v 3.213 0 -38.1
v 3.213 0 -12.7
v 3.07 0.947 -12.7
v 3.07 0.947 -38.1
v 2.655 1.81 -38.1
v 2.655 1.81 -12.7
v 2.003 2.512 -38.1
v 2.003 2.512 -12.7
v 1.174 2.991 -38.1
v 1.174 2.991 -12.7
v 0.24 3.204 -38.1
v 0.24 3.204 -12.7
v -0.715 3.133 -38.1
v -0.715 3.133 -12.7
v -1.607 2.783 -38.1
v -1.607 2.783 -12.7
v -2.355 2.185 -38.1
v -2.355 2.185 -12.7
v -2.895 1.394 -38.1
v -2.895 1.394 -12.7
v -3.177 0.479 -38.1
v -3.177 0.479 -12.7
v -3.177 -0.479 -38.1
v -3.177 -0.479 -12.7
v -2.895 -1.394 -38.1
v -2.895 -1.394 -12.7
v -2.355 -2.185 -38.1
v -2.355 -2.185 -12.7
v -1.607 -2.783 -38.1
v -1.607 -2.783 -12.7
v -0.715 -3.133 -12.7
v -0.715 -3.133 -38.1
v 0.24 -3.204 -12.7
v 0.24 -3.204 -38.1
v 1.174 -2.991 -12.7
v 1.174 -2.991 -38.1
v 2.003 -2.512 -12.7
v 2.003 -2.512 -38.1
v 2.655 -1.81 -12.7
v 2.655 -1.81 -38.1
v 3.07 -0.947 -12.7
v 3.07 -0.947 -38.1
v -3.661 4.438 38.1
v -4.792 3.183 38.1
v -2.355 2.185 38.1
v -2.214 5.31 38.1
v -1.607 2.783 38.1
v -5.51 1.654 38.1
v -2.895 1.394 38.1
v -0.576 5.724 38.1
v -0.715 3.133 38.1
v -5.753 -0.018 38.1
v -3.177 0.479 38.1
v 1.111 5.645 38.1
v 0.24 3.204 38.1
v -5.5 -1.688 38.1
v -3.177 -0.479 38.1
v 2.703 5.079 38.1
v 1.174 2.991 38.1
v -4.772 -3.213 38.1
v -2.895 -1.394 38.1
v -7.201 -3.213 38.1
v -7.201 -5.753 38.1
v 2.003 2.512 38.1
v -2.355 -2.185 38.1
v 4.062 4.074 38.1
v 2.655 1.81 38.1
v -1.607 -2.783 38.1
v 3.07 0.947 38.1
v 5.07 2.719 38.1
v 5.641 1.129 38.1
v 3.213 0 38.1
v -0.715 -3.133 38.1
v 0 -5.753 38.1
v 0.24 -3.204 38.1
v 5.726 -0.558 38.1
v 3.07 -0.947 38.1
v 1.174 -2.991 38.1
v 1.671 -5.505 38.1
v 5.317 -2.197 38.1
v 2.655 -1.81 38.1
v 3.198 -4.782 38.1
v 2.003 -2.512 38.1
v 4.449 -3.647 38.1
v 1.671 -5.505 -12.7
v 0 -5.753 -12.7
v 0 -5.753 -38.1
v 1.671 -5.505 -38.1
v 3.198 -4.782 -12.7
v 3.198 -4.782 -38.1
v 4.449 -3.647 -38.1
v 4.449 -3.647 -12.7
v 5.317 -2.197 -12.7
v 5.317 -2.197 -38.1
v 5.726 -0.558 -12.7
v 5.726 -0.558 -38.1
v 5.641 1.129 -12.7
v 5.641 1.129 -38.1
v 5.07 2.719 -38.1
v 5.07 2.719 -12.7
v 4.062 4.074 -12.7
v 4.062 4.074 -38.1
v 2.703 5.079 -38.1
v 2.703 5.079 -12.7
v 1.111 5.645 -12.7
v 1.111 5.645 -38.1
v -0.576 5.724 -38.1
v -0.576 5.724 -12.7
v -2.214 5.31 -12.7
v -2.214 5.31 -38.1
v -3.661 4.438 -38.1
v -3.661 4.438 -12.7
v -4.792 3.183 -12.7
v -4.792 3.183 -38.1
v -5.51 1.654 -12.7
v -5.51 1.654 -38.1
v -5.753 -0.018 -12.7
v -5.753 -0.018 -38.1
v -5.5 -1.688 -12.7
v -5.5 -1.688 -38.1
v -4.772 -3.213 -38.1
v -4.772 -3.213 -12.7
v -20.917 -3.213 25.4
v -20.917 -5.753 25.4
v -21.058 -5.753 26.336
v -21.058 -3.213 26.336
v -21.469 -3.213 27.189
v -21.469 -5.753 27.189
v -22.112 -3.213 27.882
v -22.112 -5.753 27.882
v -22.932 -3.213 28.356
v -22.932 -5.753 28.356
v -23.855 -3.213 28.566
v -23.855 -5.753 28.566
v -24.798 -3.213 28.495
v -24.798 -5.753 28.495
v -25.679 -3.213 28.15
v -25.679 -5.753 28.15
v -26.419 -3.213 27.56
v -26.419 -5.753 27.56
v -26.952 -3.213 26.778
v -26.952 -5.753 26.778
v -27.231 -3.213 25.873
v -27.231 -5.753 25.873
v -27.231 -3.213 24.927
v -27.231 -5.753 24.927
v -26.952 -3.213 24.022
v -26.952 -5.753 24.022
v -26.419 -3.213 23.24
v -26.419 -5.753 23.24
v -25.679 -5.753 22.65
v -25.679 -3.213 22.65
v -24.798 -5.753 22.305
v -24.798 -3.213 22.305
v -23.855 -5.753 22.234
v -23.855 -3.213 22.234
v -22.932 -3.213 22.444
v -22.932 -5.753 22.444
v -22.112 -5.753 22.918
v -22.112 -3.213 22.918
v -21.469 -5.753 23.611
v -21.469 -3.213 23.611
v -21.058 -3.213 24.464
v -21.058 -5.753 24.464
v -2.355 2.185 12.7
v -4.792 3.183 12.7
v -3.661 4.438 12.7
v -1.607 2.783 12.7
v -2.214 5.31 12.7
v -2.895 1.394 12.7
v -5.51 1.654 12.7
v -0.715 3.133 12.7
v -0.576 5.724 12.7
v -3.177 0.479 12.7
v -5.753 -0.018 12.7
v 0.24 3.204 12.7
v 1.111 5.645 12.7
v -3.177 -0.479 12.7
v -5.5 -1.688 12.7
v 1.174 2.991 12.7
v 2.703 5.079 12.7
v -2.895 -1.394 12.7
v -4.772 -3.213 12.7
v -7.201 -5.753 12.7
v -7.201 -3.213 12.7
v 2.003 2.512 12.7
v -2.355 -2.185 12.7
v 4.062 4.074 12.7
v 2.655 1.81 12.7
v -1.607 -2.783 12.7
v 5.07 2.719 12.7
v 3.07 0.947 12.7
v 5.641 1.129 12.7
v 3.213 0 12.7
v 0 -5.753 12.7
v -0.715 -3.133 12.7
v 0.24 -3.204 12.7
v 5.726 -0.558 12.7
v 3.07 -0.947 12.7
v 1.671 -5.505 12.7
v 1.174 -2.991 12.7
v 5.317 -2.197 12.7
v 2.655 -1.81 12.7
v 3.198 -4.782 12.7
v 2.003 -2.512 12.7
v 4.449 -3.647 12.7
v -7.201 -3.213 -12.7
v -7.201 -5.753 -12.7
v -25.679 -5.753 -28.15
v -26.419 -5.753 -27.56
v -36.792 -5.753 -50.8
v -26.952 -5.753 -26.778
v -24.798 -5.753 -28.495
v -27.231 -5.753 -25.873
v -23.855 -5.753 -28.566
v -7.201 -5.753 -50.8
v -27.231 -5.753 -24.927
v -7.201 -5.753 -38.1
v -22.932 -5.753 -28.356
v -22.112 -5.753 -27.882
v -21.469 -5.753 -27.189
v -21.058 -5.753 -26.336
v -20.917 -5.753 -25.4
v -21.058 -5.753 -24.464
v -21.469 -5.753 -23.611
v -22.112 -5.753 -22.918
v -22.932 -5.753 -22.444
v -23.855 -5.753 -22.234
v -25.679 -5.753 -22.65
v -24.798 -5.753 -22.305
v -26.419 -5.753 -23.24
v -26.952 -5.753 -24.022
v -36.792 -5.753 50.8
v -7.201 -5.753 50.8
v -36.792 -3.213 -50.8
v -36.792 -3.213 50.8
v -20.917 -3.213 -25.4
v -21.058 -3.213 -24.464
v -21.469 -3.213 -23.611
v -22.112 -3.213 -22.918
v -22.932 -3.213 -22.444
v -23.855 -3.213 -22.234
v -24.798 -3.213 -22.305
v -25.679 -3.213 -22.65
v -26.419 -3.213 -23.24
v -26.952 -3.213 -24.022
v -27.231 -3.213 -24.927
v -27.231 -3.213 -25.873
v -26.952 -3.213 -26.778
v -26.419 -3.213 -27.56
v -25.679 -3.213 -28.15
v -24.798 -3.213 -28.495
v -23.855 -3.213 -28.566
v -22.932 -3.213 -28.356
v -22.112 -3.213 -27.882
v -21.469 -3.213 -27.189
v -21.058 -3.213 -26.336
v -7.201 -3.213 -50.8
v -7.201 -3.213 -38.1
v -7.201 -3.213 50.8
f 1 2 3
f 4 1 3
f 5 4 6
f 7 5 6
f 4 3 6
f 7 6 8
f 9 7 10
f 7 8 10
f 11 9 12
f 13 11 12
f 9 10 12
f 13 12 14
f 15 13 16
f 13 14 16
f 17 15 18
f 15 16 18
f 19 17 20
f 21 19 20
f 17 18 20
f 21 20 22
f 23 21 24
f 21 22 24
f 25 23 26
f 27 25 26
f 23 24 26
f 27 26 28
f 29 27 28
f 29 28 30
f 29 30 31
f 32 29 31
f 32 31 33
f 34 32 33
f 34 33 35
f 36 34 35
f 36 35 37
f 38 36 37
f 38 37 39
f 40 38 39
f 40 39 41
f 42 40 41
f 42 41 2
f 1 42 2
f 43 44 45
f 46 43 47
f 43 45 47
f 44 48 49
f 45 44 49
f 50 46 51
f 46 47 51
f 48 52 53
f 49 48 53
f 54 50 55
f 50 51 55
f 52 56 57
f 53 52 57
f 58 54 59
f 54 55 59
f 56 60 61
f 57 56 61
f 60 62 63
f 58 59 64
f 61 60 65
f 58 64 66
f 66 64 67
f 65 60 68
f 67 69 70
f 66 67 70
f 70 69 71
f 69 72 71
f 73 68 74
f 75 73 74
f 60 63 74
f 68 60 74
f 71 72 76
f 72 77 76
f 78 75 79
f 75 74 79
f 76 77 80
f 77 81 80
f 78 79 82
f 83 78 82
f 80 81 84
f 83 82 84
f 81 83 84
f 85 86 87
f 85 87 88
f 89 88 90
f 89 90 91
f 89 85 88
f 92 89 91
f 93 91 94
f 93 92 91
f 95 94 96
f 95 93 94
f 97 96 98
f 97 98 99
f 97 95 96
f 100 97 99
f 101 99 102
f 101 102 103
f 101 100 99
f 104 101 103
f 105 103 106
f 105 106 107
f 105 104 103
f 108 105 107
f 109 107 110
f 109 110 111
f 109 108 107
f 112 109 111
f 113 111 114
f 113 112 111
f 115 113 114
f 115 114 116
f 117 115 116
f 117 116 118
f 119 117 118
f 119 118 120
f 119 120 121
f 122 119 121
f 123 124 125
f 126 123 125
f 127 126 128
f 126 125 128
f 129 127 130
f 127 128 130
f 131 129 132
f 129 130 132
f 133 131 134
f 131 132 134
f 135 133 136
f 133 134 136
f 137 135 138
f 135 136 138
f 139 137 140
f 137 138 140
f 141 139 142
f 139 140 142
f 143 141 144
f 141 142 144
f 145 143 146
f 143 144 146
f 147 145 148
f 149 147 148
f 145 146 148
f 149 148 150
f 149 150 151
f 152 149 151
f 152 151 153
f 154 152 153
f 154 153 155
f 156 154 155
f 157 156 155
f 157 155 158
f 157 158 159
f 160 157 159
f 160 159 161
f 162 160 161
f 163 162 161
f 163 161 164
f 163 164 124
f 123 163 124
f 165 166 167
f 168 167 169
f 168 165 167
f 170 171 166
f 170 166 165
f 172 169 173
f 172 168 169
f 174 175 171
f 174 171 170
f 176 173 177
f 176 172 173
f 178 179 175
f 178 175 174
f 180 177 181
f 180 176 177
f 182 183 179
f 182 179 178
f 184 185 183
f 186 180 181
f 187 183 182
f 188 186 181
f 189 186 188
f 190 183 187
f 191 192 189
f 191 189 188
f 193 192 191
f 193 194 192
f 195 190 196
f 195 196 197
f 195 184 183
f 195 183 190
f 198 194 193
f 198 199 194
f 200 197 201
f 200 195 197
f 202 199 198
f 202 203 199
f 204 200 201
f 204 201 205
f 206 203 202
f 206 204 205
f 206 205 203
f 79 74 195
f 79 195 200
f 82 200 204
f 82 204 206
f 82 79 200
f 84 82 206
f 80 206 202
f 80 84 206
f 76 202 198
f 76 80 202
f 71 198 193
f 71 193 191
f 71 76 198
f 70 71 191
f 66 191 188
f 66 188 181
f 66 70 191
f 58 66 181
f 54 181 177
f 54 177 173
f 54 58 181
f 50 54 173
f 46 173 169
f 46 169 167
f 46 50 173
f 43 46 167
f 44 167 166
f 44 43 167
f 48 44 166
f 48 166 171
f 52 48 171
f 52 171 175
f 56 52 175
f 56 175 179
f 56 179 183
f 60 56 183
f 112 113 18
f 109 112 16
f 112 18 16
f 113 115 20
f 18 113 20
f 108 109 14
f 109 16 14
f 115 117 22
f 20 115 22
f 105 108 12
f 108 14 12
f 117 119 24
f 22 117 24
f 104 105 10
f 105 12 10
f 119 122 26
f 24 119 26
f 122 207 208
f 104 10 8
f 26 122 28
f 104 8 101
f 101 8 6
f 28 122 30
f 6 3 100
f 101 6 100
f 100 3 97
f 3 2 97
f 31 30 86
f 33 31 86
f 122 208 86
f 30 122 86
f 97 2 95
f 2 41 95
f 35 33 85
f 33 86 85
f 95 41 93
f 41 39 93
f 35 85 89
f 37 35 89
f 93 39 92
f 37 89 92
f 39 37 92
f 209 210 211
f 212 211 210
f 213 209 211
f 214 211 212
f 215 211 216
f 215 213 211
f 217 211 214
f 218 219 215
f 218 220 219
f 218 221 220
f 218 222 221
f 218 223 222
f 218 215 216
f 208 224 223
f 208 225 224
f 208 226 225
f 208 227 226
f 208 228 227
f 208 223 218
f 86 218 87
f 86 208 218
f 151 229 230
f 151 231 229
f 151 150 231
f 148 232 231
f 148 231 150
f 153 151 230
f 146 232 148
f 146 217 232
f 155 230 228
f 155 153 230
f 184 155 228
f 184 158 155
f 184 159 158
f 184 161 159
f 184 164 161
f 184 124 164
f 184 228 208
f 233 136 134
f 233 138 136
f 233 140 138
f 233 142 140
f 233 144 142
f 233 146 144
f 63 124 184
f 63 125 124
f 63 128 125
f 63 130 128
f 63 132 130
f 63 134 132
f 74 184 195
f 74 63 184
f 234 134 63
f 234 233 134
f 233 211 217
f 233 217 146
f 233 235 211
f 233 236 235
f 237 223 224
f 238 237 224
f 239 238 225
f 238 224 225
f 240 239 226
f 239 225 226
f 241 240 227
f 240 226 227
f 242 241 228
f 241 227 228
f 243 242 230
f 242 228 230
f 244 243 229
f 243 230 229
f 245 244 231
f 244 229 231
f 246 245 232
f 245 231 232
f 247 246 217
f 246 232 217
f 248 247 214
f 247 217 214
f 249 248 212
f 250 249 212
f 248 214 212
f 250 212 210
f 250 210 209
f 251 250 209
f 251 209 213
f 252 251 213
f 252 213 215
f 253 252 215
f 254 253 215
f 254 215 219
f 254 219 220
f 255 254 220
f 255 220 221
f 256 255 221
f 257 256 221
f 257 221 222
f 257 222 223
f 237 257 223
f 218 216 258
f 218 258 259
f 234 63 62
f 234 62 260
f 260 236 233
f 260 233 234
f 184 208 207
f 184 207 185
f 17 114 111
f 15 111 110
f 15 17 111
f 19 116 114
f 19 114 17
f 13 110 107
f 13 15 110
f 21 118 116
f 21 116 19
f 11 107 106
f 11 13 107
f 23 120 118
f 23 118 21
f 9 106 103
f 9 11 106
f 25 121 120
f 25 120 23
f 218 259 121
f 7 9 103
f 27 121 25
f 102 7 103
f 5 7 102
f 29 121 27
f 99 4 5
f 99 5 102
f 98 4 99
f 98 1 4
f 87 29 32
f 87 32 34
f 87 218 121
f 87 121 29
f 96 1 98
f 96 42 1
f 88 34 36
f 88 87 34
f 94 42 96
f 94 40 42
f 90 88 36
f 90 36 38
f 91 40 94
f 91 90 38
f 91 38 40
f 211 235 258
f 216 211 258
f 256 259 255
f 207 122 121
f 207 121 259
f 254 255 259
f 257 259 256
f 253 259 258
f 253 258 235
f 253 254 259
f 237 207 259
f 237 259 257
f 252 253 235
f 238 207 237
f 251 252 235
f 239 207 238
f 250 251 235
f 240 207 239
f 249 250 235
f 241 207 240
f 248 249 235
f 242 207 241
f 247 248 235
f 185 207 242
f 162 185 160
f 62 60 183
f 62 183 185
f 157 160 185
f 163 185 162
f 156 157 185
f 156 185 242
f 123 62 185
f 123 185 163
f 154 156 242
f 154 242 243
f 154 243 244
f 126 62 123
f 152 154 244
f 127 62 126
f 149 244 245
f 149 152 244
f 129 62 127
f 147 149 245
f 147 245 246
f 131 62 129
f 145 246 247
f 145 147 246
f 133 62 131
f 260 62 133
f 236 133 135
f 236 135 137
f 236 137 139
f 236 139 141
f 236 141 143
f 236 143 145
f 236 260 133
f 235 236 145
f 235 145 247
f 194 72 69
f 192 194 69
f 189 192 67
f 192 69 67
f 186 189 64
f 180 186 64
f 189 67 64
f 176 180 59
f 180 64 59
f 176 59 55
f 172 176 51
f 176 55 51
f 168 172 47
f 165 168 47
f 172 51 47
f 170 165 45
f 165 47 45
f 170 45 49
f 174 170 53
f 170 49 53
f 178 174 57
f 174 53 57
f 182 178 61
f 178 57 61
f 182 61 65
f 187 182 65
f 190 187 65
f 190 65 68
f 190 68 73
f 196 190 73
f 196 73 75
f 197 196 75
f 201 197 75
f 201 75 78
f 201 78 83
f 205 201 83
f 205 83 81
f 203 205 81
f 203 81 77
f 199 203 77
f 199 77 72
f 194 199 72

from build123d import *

# Parameters (mm, degrees)
F1_DEPTH = 50.8
F2_W     = 25.4
F2_H     = 25.4
F2_H_2   = 12.7
F2_R     = 3.175
F3_DEPTH = 11.5072
F4_R     = 3.2131
F5_DEPTH = 88.901


with BuildPart() as f1:
    # F0 (on Top) → F1 (new body, symmetric)
    with BuildSketch(Plane.XY):
        with BuildLine():
            Line((-36.7919, -5.7531), (0, -5.7531))
            ThreePointArc((0, -5.7531), (2.703042, 5.078555), (-4.772227, -3.2131))
            Line((-4.772227, -3.2131), (-36.7919, -3.2131))
            Line((-36.7919, -3.2131), (-36.7919, -5.7531))
        make_face()
    extrude(amount=F1_DEPTH, both=True)

    # F2 (on face) → F3 (cut, through all)
    with BuildSketch(Plane.XZ.offset(5.7531)):
        with Locations((5.4991, 0)):
            Rectangle(F2_W, F2_H)
        with Locations((5.4991, 44.45)):
            Rectangle(F2_W, F2_H_2)
        with Locations((5.4991, -44.45)):
            Rectangle(F2_W, F2_H_2)
        with Locations((-24.0919, 25.4)):
            Circle(F2_R)
        with Locations((-24.0919, -25.4)):
            Circle(F2_R)
    extrude(amount=-F3_DEPTH, mode=Mode.SUBTRACT)

    # F4 (on face) → F5 (cut, through all)
    with BuildSketch(Plane.XY.offset(38.1)):
        Circle(F4_R)
    extrude(amount=-F5_DEPTH, mode=Mode.SUBTRACT)


solid = f1.part
